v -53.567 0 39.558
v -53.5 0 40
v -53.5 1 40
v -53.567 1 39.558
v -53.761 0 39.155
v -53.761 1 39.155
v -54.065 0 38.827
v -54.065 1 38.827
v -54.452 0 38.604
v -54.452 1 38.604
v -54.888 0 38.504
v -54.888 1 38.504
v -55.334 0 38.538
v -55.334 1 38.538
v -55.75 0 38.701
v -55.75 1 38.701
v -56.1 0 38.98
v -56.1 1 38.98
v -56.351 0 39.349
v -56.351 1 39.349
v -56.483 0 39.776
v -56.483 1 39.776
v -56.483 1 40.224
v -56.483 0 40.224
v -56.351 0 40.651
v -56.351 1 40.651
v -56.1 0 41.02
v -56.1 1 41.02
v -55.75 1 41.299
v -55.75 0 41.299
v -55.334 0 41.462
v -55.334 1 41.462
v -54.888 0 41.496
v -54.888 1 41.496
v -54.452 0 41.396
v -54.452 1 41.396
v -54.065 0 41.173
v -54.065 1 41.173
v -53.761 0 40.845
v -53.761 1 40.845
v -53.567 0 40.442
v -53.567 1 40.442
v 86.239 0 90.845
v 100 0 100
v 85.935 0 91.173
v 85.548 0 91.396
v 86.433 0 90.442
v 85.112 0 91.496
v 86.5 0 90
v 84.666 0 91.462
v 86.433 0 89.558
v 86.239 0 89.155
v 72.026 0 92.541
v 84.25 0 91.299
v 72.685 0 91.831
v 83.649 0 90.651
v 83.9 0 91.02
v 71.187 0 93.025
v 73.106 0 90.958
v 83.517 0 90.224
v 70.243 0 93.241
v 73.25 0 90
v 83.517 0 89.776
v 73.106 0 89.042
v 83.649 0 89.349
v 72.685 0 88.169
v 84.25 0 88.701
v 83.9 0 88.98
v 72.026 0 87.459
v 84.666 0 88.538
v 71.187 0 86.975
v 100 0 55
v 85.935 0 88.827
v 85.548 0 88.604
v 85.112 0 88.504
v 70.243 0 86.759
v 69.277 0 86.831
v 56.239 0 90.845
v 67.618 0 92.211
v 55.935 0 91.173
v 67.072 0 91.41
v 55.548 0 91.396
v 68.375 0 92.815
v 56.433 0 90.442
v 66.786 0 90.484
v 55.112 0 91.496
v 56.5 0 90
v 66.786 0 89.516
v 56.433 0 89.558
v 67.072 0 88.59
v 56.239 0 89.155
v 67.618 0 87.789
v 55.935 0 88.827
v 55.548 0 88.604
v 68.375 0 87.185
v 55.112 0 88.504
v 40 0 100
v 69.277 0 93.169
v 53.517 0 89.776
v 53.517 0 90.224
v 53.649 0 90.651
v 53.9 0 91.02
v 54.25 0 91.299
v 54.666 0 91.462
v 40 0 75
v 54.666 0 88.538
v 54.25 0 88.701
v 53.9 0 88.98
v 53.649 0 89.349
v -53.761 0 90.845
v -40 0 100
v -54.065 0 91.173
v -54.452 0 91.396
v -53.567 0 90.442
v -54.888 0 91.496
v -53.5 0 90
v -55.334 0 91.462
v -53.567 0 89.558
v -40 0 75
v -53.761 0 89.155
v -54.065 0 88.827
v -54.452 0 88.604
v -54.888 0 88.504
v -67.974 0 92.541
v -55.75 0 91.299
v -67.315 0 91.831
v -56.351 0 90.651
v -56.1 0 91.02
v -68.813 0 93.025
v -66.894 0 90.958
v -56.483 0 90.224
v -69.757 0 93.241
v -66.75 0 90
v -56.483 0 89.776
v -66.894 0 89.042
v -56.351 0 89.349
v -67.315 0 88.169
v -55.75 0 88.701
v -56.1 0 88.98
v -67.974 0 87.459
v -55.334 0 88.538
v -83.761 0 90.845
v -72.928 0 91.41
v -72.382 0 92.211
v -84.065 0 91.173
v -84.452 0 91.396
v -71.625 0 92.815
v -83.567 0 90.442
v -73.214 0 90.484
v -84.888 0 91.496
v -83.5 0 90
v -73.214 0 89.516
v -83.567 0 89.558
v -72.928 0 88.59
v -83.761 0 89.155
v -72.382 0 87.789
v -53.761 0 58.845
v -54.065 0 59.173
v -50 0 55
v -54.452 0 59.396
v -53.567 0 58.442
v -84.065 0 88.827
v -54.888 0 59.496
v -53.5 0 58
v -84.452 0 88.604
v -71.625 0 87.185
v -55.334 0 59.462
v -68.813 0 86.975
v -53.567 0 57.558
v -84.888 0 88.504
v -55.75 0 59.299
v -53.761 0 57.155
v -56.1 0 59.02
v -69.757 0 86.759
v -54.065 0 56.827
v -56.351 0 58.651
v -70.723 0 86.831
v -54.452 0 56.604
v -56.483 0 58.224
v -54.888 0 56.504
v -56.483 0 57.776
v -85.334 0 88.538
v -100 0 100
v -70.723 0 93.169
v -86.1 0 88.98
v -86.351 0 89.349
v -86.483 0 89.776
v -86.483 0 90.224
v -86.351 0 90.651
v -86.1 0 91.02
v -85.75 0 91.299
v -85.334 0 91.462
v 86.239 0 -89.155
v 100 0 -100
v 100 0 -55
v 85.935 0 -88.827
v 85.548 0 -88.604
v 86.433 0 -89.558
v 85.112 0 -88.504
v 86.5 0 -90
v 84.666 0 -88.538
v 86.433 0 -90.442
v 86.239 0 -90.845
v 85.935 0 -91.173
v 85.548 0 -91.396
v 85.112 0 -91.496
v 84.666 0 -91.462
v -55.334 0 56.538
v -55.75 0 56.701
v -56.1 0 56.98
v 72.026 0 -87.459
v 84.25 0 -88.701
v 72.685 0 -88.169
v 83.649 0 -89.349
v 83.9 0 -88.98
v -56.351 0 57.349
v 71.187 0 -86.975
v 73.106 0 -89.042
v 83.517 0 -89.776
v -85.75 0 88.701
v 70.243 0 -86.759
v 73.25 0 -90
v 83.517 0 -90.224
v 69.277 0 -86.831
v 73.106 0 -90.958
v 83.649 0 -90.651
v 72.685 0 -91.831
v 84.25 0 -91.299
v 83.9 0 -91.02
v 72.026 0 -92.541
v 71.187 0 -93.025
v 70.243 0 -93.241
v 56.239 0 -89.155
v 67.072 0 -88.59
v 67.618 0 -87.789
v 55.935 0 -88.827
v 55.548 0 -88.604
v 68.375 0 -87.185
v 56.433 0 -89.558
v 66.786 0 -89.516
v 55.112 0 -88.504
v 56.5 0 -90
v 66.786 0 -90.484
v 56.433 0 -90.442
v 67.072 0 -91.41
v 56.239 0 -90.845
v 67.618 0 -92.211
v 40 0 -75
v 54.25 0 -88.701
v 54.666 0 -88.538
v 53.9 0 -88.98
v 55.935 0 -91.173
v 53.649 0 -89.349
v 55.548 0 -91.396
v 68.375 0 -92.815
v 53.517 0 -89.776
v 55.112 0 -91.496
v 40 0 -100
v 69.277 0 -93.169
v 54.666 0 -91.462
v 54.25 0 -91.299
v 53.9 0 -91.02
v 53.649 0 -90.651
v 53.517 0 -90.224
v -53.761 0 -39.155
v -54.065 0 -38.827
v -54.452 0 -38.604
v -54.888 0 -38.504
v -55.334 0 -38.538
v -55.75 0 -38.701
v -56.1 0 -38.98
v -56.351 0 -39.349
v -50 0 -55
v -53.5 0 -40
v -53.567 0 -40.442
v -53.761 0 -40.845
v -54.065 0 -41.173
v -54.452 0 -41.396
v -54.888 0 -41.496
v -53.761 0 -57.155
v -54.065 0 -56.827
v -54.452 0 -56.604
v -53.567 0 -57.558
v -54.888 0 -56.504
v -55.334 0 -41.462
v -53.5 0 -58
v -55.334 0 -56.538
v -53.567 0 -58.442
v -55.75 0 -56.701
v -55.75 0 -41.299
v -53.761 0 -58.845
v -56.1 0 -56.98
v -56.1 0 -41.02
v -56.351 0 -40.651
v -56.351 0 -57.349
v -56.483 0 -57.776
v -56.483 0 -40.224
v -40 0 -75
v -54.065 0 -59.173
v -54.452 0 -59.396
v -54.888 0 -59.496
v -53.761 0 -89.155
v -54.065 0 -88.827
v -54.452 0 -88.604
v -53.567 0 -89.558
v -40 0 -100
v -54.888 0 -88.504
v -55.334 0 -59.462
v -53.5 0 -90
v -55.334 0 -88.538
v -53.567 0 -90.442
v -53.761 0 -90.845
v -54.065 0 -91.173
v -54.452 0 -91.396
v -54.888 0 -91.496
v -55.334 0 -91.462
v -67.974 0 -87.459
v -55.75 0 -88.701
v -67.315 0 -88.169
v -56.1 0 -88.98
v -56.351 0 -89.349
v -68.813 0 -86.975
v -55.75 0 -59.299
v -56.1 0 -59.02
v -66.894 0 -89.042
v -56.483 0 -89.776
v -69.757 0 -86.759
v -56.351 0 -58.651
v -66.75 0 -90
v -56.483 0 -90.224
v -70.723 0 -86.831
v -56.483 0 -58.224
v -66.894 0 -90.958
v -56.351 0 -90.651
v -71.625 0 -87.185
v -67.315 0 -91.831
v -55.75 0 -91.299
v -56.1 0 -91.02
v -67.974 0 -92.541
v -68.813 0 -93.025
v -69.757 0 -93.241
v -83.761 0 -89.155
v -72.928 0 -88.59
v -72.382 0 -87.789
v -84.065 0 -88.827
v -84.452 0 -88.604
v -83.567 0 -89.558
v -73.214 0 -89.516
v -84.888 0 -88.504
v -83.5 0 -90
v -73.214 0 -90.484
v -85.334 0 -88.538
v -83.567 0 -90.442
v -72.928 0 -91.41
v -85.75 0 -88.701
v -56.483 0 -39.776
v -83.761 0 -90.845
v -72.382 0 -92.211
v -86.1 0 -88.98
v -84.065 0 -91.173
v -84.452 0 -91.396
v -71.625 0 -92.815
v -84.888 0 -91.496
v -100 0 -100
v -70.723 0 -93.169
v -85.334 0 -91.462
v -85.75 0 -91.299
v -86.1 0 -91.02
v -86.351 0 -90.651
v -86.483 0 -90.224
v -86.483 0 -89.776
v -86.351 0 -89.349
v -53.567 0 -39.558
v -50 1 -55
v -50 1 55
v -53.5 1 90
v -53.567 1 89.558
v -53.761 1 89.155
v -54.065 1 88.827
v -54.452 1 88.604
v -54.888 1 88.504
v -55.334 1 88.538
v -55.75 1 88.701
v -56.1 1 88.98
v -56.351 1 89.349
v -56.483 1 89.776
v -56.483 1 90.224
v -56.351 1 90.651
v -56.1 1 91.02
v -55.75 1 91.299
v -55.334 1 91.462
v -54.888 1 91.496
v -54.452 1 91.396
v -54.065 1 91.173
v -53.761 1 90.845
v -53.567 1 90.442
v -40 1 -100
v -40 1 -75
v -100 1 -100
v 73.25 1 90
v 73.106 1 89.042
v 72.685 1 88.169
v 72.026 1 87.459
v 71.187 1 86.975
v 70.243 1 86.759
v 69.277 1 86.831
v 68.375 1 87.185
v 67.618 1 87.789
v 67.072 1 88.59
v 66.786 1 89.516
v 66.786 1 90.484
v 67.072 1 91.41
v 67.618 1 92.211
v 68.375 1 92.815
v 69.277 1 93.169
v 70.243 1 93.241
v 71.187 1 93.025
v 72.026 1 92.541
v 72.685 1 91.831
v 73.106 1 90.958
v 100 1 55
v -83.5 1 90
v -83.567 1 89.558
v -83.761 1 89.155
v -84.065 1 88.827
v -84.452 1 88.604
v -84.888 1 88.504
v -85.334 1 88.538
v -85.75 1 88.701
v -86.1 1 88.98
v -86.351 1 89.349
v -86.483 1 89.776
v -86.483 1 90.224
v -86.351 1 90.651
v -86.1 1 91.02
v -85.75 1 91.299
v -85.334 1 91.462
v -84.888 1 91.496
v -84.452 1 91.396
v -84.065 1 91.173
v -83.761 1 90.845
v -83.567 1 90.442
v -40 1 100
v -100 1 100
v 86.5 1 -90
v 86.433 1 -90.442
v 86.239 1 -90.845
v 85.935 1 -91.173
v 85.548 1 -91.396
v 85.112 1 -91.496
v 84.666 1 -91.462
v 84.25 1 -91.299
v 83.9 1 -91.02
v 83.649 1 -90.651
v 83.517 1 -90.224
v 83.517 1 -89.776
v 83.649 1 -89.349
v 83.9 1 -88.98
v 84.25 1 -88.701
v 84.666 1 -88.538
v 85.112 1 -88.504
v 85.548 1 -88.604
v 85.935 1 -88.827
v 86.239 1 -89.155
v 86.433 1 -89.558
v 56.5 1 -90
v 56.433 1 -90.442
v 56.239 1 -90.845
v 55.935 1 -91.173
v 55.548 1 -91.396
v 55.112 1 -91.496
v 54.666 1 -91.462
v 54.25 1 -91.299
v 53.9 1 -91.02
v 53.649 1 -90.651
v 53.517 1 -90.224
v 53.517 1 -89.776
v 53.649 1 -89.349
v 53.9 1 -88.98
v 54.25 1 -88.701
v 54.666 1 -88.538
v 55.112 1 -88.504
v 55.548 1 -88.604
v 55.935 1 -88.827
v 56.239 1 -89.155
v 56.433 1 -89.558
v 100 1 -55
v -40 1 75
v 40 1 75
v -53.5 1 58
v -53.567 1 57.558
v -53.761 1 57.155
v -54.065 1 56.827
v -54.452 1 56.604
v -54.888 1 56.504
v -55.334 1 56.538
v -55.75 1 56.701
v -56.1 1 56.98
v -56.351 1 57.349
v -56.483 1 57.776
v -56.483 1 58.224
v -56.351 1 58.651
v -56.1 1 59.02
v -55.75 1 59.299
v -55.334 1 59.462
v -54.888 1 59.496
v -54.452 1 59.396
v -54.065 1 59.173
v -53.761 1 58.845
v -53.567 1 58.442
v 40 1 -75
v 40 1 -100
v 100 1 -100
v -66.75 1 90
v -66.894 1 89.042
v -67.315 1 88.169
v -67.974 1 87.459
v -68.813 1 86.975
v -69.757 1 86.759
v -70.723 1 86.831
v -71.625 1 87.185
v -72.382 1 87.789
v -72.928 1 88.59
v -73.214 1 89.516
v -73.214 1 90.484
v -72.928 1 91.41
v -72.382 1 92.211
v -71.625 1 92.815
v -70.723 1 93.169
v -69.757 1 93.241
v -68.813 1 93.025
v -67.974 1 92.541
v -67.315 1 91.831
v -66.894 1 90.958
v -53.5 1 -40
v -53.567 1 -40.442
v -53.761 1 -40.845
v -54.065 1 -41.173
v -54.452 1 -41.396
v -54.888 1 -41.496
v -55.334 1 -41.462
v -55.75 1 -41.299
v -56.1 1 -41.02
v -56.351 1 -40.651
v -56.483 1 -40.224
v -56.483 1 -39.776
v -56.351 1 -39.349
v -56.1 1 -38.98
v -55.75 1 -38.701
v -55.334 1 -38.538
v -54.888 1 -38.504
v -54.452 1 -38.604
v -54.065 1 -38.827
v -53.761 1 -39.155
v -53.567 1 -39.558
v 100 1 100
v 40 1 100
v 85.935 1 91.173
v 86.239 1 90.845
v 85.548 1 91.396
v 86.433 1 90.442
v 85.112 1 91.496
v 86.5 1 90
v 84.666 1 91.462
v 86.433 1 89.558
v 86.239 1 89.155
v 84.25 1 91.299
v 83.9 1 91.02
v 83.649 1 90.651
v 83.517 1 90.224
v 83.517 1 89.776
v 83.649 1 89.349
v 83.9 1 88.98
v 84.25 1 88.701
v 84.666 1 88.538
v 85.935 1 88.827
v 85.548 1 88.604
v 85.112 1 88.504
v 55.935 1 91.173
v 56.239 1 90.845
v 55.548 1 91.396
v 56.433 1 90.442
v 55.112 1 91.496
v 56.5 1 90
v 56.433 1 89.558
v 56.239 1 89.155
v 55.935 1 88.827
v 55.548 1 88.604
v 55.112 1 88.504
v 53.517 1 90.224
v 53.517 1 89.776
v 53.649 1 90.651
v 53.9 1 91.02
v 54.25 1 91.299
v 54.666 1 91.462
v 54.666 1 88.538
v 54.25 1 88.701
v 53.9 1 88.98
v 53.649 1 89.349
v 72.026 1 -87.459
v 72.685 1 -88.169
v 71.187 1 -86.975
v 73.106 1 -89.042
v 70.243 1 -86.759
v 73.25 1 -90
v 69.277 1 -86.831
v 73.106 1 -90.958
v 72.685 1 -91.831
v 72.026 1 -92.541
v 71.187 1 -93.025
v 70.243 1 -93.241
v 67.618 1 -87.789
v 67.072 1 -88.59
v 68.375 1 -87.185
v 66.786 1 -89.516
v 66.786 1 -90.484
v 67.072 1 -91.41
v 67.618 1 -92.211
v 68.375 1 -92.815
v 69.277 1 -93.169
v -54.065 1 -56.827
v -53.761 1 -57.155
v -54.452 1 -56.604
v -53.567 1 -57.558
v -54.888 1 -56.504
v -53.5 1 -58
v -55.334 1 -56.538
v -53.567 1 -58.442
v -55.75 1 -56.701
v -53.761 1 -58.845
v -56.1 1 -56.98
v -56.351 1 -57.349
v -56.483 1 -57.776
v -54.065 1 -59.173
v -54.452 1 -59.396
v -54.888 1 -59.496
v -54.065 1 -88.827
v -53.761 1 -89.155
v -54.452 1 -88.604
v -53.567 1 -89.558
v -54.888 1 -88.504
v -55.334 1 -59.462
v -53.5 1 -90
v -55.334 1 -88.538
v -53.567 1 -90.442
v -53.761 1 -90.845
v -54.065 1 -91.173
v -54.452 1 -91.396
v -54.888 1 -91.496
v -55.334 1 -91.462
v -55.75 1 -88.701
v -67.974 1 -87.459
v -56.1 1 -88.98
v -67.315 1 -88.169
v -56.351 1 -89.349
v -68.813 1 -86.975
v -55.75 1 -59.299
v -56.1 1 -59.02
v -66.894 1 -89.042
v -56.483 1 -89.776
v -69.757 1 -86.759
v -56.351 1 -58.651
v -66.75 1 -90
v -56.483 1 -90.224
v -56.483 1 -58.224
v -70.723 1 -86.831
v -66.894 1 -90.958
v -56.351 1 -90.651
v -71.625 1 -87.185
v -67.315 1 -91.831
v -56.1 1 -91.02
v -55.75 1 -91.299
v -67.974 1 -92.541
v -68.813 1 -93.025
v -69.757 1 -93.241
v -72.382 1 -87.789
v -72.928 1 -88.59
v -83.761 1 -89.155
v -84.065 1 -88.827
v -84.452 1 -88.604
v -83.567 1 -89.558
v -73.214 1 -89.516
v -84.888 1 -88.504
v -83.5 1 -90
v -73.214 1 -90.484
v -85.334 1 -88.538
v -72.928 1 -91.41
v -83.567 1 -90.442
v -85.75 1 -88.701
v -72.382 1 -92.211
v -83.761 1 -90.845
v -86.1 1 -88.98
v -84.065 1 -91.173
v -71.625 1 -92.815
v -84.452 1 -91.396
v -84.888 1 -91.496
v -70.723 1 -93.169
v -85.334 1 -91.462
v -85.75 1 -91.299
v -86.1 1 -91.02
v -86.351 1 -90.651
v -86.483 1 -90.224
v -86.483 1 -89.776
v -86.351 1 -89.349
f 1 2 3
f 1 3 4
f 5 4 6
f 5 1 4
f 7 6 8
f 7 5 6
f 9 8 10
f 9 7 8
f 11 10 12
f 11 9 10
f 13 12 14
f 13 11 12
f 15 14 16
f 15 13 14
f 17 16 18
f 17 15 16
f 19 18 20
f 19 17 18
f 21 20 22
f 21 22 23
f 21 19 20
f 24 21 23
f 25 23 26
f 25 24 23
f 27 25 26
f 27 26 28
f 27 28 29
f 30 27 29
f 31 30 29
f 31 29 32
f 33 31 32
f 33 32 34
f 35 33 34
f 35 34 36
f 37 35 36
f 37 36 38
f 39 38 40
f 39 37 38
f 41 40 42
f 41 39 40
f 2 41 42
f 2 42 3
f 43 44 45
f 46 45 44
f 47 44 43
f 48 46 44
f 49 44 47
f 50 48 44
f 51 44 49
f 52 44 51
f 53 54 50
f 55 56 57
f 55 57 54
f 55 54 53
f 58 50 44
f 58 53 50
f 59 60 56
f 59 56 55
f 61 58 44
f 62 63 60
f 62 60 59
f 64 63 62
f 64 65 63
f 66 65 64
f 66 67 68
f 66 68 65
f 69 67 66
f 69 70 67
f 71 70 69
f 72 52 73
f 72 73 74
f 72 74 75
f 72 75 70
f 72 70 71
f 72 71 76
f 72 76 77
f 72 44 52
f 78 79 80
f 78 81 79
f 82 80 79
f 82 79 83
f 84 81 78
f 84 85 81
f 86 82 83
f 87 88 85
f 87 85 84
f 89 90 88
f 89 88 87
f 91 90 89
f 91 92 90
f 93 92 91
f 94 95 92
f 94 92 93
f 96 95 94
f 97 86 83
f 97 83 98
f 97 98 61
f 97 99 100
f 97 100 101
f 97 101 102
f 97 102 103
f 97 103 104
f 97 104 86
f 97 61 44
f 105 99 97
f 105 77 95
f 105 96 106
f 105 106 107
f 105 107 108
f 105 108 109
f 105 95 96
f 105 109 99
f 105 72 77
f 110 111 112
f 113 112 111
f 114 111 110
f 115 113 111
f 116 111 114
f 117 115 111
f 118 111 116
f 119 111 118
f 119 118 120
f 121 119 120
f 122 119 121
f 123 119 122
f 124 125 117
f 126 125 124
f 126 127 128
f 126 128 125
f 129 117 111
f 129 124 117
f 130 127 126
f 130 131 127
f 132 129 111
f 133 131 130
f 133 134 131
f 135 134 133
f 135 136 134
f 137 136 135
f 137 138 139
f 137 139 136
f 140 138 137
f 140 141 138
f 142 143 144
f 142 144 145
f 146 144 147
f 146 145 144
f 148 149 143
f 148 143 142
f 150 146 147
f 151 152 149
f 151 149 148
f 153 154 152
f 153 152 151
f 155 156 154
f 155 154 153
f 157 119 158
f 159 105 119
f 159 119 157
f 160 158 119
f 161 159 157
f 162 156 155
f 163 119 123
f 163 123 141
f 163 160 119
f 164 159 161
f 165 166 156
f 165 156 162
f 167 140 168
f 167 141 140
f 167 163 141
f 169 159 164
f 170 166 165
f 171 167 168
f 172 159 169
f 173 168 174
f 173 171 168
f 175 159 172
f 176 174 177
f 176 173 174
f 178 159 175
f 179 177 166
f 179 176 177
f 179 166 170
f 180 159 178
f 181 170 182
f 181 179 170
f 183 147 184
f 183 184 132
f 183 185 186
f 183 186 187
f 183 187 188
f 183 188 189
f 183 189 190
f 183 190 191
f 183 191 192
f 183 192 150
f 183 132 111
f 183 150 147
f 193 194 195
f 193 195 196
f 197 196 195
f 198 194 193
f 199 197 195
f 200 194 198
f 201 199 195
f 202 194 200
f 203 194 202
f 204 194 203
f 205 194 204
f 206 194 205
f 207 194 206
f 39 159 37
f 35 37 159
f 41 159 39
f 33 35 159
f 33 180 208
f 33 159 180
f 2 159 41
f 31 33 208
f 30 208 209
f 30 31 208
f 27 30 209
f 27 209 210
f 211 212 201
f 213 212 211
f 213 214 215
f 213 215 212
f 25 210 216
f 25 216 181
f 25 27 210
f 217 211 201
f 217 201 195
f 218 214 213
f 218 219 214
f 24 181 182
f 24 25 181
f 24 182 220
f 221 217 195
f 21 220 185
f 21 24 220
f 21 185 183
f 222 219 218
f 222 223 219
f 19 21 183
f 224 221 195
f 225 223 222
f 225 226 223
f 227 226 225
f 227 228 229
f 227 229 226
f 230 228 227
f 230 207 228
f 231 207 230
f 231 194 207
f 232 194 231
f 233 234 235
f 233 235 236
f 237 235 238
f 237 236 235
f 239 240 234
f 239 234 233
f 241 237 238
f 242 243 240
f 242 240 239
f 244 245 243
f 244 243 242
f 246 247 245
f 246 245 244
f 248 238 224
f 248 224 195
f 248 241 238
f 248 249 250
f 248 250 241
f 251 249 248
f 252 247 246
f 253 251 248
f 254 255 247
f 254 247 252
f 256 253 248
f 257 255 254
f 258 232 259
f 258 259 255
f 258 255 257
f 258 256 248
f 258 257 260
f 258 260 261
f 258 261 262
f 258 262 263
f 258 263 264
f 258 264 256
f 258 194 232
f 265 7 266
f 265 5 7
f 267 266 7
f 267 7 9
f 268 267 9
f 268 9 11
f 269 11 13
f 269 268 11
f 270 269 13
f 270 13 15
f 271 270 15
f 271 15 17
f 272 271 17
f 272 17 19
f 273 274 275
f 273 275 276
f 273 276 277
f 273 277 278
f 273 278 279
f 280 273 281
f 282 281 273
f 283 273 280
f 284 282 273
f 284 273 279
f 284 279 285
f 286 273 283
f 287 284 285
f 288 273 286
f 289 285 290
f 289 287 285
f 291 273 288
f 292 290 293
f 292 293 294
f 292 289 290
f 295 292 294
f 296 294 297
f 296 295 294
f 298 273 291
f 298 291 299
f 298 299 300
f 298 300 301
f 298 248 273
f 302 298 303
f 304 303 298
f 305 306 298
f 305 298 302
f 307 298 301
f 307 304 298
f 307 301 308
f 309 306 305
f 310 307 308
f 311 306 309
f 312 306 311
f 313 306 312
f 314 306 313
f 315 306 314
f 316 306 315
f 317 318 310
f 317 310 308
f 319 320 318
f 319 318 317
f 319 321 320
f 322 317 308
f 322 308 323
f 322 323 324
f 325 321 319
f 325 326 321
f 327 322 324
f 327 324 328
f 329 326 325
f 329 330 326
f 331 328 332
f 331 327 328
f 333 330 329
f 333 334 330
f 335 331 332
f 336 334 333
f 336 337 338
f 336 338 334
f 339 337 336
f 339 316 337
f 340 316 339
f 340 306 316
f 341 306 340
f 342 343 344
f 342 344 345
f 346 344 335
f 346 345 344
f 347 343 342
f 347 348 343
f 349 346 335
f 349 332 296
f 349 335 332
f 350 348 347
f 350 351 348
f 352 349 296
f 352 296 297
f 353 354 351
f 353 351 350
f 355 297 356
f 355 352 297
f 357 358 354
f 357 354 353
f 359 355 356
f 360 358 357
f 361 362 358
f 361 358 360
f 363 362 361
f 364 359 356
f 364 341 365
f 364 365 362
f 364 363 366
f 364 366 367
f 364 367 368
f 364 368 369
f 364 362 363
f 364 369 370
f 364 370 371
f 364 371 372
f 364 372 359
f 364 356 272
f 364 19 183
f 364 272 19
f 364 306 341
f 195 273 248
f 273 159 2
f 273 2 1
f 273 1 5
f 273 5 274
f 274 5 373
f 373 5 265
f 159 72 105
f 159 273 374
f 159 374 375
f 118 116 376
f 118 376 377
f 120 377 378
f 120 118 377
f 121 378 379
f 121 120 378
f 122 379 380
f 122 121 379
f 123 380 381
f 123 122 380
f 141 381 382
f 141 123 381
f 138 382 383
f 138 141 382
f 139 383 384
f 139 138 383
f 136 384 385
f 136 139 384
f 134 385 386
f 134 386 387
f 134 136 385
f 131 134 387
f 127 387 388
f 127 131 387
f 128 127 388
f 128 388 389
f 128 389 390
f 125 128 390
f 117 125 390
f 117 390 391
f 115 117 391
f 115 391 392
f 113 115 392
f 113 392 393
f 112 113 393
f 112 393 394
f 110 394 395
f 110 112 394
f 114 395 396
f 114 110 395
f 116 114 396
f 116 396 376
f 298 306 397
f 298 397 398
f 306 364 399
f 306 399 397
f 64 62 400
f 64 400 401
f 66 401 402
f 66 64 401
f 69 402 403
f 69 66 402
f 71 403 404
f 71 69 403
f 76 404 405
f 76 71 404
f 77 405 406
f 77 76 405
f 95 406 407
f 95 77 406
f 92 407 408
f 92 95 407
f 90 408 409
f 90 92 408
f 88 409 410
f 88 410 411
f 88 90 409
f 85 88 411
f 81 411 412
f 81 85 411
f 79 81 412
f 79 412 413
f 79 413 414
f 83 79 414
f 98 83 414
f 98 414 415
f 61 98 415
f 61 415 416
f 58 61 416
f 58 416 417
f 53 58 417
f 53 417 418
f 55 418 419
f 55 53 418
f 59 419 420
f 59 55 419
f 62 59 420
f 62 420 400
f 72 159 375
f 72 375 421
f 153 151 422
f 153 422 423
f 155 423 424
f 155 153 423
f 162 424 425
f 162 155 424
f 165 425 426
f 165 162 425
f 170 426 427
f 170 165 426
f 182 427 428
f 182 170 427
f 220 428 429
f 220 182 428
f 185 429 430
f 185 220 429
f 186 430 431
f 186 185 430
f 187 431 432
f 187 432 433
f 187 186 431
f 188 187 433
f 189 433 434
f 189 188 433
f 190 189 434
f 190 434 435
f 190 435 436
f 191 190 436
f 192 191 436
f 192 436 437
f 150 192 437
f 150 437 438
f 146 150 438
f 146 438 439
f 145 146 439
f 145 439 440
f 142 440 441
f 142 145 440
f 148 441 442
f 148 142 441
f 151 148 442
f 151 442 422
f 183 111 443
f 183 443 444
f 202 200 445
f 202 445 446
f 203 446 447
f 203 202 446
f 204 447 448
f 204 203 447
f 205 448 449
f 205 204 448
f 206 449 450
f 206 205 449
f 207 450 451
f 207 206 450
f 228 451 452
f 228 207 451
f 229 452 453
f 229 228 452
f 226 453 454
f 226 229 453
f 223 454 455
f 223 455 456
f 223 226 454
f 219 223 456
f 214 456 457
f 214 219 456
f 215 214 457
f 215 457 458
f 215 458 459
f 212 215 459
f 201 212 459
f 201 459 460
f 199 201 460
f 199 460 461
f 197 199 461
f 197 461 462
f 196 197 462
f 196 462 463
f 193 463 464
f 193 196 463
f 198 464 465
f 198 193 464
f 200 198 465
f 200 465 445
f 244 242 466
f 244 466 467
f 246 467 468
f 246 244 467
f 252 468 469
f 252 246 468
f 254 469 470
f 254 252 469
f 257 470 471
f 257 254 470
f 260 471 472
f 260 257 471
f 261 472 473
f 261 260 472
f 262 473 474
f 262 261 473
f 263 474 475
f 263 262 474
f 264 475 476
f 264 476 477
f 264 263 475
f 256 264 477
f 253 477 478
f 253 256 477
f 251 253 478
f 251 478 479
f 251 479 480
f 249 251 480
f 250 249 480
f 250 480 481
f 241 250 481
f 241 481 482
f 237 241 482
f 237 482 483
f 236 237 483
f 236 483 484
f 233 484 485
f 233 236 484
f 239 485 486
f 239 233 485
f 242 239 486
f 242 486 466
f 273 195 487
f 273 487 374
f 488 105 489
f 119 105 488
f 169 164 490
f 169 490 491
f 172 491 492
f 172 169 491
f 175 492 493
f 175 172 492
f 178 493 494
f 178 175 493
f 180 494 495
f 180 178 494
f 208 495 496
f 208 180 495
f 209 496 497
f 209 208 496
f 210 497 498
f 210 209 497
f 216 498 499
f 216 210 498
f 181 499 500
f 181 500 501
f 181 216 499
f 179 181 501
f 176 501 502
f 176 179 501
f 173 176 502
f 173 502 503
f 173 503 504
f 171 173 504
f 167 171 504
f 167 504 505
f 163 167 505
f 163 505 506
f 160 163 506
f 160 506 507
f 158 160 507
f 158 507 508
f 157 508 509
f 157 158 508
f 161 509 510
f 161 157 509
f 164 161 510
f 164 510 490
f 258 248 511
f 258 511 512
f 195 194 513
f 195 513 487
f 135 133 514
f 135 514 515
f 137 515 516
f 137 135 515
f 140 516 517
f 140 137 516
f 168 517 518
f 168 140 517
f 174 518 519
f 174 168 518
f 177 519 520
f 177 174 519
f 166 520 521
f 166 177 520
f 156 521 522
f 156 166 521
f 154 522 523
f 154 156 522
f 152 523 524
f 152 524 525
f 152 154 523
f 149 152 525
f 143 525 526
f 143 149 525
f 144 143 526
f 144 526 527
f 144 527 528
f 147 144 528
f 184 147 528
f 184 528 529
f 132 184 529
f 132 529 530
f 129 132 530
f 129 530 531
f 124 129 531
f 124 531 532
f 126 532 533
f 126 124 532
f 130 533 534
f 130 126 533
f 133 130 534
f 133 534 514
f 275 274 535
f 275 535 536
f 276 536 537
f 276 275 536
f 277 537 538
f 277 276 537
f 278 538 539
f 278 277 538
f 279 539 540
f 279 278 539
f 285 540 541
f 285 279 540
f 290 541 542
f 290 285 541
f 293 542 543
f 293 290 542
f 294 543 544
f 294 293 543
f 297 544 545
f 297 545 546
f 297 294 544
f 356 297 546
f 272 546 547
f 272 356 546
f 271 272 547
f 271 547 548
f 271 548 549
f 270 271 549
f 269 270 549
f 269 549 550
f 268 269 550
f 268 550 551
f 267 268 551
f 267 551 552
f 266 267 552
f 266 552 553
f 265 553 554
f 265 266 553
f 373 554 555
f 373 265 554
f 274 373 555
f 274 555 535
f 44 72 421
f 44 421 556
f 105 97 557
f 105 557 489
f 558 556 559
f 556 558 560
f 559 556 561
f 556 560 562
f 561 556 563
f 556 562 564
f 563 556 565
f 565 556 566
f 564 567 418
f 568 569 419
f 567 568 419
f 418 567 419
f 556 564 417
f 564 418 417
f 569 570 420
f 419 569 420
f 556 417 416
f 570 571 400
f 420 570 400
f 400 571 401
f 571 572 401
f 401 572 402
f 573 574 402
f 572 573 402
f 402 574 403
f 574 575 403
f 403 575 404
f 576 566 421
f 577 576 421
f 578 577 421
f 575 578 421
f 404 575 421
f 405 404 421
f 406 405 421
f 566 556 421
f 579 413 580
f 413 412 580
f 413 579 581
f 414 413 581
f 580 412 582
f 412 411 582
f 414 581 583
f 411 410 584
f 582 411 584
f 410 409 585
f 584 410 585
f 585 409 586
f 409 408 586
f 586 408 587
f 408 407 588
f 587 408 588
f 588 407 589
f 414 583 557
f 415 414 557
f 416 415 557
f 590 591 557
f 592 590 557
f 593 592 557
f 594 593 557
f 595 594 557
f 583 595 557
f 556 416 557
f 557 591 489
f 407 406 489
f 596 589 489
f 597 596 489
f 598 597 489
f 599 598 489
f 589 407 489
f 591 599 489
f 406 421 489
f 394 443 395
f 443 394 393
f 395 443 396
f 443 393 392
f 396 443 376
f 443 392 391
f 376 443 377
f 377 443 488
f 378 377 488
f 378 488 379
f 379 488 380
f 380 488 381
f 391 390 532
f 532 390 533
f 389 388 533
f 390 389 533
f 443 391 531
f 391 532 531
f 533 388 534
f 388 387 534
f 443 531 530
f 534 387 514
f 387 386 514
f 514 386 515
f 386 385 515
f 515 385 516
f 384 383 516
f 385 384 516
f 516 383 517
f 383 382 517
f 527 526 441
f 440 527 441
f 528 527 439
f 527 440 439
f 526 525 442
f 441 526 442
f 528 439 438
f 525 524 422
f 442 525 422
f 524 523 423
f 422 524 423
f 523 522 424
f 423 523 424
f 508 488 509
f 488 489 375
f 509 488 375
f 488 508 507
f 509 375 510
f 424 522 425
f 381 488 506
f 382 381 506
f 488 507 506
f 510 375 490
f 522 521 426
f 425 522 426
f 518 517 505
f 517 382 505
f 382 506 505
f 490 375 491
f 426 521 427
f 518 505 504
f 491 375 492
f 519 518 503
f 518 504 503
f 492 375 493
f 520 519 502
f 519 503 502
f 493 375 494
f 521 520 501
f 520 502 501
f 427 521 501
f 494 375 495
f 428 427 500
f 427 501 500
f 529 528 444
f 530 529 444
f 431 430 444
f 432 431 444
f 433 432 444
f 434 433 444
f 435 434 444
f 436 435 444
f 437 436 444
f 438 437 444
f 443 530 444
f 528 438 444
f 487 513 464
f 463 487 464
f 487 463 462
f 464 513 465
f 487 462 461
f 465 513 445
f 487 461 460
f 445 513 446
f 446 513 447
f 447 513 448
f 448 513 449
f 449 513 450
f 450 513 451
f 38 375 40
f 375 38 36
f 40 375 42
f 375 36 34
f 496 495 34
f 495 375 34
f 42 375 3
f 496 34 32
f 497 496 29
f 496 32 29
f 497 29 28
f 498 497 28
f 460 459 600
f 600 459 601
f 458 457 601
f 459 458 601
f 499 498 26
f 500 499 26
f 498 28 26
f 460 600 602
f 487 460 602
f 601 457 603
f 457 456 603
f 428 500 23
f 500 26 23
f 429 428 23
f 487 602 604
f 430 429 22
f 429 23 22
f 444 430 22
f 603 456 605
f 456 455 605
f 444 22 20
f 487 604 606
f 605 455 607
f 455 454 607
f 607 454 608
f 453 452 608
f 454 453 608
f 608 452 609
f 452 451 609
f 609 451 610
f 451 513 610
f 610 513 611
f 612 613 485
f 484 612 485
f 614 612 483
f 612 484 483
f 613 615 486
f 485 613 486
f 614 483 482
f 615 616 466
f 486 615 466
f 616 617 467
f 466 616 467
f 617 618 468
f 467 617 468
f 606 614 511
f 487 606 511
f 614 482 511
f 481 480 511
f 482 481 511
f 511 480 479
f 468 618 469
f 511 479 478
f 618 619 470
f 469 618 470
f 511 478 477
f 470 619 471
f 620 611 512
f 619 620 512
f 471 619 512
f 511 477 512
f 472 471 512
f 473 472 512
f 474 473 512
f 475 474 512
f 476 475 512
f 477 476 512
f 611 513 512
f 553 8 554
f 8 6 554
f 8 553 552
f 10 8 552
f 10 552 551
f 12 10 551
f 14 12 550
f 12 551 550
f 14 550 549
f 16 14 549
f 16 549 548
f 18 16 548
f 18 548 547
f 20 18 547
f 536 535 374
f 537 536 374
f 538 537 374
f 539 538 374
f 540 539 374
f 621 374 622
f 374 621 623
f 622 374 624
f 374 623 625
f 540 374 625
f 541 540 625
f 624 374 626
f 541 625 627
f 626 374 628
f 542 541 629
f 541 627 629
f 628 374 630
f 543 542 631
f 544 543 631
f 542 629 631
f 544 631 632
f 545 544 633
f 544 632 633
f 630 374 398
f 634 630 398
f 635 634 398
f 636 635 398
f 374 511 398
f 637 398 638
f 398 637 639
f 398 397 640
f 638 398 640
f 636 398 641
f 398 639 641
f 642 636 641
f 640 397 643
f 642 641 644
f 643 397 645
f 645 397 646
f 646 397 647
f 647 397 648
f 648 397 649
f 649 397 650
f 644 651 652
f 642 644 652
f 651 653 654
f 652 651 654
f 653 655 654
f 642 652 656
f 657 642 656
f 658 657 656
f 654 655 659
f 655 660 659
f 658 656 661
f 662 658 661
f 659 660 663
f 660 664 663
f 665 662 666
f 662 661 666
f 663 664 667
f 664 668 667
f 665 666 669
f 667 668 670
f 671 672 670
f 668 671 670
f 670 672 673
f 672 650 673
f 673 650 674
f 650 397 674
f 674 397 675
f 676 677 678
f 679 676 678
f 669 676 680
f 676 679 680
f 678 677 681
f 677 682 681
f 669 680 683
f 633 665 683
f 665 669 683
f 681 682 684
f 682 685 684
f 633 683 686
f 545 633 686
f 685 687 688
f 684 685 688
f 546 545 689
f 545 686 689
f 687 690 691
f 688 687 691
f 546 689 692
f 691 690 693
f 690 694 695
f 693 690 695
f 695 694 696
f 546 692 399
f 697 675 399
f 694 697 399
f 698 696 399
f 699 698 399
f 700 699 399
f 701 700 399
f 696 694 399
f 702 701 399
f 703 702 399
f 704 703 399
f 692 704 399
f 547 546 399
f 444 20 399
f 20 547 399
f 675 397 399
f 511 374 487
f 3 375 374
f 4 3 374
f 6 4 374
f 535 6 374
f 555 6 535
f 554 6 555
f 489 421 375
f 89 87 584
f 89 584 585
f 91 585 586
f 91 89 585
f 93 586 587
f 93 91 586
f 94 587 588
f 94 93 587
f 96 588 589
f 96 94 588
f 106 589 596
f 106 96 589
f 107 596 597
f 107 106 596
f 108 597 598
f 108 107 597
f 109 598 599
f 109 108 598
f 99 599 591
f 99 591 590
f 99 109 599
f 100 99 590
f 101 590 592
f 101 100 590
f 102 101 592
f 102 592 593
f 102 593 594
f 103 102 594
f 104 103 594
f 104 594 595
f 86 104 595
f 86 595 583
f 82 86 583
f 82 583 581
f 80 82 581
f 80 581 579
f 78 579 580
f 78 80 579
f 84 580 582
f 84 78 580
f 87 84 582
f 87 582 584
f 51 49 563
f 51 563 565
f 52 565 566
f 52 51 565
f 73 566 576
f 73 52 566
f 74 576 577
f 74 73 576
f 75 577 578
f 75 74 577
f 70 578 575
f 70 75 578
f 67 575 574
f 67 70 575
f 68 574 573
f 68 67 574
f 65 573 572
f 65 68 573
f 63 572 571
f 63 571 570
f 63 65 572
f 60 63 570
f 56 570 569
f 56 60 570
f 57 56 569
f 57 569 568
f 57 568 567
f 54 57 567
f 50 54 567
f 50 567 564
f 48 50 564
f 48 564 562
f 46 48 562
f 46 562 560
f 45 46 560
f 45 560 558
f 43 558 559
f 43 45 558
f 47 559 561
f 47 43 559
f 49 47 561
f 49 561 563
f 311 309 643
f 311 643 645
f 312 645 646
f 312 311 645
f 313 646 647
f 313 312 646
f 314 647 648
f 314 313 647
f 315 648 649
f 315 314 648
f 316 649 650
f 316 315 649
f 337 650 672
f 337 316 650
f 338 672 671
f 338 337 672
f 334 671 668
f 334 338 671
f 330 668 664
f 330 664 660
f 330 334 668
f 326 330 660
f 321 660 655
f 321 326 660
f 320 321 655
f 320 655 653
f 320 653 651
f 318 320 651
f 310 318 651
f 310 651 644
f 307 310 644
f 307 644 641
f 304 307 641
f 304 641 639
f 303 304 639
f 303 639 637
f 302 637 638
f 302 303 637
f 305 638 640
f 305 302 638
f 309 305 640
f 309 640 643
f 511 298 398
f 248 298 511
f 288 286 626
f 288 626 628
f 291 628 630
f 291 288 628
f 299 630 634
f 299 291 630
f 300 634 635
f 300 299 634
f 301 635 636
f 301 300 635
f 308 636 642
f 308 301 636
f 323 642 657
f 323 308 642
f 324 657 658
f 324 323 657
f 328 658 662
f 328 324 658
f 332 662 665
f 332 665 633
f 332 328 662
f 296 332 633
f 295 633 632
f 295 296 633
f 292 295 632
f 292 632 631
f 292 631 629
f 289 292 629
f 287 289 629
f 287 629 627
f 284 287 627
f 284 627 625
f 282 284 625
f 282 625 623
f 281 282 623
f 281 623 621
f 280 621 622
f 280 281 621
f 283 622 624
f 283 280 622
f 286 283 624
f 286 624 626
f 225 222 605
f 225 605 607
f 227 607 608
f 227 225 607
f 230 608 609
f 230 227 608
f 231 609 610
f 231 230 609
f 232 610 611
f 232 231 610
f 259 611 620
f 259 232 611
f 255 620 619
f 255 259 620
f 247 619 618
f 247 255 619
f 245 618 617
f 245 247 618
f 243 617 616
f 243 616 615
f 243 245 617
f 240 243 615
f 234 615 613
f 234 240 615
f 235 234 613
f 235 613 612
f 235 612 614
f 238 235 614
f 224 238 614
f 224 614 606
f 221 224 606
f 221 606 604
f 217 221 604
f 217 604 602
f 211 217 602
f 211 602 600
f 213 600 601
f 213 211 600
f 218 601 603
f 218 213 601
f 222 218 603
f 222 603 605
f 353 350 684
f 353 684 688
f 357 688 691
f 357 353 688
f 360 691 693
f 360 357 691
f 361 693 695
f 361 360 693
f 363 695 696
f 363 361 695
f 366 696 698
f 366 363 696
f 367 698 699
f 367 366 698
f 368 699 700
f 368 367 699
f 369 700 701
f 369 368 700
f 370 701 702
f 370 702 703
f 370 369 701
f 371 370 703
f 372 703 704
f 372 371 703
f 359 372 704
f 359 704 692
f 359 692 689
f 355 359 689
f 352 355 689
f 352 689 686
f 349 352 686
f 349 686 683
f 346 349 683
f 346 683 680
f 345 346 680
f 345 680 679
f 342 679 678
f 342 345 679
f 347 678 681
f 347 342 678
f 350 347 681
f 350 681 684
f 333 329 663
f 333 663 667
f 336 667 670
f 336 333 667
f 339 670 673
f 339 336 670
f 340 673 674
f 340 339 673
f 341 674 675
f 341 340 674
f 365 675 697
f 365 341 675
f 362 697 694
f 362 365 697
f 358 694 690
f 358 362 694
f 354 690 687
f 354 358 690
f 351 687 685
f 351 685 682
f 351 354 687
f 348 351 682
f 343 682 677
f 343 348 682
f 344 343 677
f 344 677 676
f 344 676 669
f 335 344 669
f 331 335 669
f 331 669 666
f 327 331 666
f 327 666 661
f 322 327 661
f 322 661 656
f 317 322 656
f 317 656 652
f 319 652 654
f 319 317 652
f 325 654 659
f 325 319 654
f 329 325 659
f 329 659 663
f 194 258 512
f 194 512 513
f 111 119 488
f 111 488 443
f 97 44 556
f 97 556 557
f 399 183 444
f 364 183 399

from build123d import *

# Parameters (mm, degrees)
ESQUISSE1_R        = 1.5
ESQUISSE1_R_2      = 3.25
BOSS_EXTRU_1_DEPTH = 1


with BuildPart() as part:
    # Esquisse1 → Boss.-Extru.1 (new body)
    with BuildSketch(Plane(origin=(0, 0, 0), x_dir=(1, 0, 0), z_dir=(0, 1, 0))):
        Polygon((-40, 100), (-40, 75), (40, 75), (40, 100), (100, 100), (100, 55), (-50, 55), (-50, -55), (100, -55), (100, -100), (40, -100), (40, -75), (-40, -75), (-40, -100), (-100, -100), (-100, 100), align=None)
        with Locations((-85, 90)):
            Circle(ESQUISSE1_R, mode=Mode.SUBTRACT)
        with Locations((-55, 90)):
            Circle(ESQUISSE1_R, mode=Mode.SUBTRACT)
        with Locations((-55, -90)):
            Circle(ESQUISSE1_R, mode=Mode.SUBTRACT)
        with Locations((-85, -90)):
            Circle(ESQUISSE1_R, mode=Mode.SUBTRACT)
        with Locations((55, -90)):
            Circle(ESQUISSE1_R, mode=Mode.SUBTRACT)
        with Locations((85, -90)):
            Circle(ESQUISSE1_R, mode=Mode.SUBTRACT)
        with Locations((-55, -58)):
            Circle(ESQUISSE1_R, mode=Mode.SUBTRACT)
        with Locations((-55, -40)):
            Circle(ESQUISSE1_R, mode=Mode.SUBTRACT)
        with Locations((-55, 40)):
            Circle(ESQUISSE1_R, mode=Mode.SUBTRACT)
        with Locations((-55, 58)):
            Circle(ESQUISSE1_R, mode=Mode.SUBTRACT)
        with Locations((-70, -90)):
            Circle(ESQUISSE1_R_2, mode=Mode.SUBTRACT)
        with Locations((70, -90)):
            Circle(ESQUISSE1_R_2, mode=Mode.SUBTRACT)
        with Locations((70, 90)):
            Circle(ESQUISSE1_R_2, mode=Mode.SUBTRACT)
        with Locations((-70, 90)):
            Circle(ESQUISSE1_R_2, mode=Mode.SUBTRACT)
        with Locations((55, 90)):
            Circle(ESQUISSE1_R, mode=Mode.SUBTRACT)
        with Locations((85, 90)):
            Circle(ESQUISSE1_R, mode=Mode.SUBTRACT)
    extrude(amount=BOSS_EXTRU_1_DEPTH)


solid = part.part
